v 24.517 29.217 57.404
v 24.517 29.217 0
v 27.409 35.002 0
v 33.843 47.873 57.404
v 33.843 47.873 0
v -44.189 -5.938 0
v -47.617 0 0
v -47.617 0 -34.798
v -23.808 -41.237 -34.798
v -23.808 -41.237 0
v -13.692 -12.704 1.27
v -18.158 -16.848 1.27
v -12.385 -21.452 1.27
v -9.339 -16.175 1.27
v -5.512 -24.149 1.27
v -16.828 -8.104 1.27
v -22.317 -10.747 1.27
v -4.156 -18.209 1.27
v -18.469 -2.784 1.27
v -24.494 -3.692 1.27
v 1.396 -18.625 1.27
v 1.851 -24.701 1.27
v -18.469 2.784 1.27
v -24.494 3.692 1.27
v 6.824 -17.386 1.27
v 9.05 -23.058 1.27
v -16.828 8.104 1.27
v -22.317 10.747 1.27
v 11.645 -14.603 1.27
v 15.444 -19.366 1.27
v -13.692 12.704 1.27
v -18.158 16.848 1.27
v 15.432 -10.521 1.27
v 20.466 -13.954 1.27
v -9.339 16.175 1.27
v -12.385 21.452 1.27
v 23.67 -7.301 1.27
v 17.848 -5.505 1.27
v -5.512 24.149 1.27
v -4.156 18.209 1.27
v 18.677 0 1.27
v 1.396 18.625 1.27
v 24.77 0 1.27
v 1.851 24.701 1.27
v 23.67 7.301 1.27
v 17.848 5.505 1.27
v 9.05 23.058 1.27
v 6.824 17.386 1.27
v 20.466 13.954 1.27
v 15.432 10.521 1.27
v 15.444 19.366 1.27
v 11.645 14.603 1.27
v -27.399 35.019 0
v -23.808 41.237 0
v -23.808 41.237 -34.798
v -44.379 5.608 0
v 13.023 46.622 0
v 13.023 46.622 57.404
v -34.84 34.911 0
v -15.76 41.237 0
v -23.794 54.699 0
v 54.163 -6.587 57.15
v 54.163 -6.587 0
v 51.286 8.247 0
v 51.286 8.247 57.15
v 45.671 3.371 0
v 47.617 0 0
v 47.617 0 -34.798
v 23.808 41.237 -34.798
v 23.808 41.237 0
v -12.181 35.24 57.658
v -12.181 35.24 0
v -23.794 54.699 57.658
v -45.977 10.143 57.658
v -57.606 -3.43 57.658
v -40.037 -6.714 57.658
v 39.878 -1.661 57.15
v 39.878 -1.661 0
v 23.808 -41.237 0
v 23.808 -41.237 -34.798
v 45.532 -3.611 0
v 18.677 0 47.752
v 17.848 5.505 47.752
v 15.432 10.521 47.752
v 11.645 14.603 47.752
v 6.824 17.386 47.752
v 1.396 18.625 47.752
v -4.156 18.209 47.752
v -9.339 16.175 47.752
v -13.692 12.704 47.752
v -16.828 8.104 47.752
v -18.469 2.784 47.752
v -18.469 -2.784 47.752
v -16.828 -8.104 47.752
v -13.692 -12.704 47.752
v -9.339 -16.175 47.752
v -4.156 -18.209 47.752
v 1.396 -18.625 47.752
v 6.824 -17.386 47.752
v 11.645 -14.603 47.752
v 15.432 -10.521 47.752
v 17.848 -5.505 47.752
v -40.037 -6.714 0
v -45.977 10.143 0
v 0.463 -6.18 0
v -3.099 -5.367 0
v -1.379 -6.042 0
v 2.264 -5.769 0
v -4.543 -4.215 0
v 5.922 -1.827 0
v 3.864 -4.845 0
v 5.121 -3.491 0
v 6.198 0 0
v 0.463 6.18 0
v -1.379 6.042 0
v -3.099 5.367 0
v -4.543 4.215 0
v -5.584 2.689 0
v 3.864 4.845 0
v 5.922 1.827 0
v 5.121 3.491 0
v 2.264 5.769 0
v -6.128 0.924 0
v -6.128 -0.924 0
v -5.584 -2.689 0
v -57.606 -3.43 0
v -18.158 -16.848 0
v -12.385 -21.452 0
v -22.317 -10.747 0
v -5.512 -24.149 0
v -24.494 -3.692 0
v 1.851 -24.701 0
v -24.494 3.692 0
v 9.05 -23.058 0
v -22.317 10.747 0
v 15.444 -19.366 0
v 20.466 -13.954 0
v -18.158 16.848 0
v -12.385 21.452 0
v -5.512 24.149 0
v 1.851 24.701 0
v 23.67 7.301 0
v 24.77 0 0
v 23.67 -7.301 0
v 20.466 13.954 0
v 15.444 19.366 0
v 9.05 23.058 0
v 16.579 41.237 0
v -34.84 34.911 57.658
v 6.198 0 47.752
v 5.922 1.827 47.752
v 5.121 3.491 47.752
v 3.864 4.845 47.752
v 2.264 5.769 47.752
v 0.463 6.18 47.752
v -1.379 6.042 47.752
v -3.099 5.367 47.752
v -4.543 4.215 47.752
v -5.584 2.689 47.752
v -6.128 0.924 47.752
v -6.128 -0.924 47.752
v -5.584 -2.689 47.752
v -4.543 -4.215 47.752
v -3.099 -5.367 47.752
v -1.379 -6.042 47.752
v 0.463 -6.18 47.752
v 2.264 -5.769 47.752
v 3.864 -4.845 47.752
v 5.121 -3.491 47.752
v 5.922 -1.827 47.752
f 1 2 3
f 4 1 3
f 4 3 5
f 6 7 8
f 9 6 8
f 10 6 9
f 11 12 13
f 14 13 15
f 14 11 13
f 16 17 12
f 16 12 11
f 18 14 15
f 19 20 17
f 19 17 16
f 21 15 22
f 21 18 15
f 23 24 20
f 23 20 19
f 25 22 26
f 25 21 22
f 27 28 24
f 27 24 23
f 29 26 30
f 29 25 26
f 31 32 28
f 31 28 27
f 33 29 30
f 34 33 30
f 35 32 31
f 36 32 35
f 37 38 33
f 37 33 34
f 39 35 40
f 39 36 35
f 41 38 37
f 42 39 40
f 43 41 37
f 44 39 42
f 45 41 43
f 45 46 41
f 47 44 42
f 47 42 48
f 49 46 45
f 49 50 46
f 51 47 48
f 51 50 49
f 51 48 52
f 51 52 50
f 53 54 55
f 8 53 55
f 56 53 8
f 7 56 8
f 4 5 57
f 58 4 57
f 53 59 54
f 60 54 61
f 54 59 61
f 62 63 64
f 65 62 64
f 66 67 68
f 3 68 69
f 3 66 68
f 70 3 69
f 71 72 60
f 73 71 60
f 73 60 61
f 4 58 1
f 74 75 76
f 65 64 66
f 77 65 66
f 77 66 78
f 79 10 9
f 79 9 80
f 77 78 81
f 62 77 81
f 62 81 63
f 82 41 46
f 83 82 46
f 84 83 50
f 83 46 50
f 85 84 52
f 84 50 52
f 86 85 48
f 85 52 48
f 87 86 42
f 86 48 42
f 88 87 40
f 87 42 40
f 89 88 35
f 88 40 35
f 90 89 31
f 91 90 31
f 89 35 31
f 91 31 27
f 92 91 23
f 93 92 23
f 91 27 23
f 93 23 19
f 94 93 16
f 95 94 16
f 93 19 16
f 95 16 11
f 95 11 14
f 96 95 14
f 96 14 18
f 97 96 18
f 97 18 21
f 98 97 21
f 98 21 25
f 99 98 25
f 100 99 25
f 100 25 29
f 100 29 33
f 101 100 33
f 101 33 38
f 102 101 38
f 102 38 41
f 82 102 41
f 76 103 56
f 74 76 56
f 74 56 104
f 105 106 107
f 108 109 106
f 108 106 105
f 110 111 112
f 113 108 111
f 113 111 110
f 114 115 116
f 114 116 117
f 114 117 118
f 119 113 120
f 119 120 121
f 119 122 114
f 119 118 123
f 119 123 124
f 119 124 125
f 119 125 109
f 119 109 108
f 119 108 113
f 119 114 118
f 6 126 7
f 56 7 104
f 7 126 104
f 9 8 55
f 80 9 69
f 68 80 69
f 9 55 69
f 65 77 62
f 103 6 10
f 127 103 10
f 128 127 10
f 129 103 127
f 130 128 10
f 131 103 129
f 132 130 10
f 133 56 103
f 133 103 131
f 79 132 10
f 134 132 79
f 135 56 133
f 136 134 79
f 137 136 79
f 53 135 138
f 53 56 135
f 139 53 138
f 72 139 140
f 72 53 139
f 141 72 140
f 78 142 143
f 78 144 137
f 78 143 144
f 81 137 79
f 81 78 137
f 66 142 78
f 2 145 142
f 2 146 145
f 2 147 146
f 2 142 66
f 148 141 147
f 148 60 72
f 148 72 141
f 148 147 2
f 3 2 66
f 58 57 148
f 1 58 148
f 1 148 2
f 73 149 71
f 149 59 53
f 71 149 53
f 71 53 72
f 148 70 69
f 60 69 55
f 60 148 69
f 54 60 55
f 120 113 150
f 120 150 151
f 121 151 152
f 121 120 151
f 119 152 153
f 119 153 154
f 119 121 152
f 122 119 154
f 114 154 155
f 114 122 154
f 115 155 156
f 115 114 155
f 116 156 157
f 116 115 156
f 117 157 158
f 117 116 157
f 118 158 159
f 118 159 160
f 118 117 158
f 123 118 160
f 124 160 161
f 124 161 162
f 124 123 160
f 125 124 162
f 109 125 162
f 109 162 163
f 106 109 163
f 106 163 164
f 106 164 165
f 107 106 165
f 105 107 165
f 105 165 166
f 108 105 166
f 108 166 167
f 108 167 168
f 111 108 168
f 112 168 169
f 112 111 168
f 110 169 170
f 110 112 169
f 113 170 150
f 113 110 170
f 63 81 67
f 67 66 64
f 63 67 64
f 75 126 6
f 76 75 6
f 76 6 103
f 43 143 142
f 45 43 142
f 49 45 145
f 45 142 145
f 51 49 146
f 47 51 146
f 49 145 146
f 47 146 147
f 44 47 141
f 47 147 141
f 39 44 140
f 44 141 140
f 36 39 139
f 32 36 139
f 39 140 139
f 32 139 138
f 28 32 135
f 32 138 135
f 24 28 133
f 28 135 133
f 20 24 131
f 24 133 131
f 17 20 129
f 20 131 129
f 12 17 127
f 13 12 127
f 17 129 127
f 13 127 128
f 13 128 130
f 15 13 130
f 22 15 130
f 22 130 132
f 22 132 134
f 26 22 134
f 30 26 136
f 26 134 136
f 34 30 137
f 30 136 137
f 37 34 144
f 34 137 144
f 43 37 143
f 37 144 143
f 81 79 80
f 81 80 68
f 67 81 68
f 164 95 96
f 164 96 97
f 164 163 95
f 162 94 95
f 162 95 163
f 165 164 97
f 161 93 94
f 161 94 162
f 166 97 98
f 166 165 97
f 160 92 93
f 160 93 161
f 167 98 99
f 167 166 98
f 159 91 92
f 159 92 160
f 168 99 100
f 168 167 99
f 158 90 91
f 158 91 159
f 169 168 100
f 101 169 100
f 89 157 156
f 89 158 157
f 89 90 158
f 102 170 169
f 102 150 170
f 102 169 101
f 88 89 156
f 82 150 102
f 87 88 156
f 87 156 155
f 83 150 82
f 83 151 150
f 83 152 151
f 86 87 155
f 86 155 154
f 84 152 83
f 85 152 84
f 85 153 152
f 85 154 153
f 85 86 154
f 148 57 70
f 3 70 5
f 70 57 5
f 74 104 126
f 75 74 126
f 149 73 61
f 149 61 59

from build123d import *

# Parameters (mm, degrees)
F0_R      = 18.677485
F0_R_2    = 6.197536
F1_DEPTH  = 47.752
F3_DEPTH  = 34.798
F4_R      = 24.770199
F4_R_2    = 12.651261
F5_DEPTH  = 1.27
F7_DEPTH  = 57.658
F9_DEPTH  = 57.404
F11_DEPTH = 57.658
F13_DEPTH = 57.15


with BuildPart() as f1:
    # F0 (on Top) → F1 (new body)
    with BuildSketch(Plane.XY):
        Circle(F0_R)
        Circle(F0_R_2, mode=Mode.SUBTRACT)
    extrude(amount=F1_DEPTH)

    # F2 (on Top) → F3 (join)
    with BuildSketch(Plane.XY):
        Polygon((23.808415, 41.237384), (-23.808415, 41.237384), (-47.61683, 0), (-23.808415, -41.237384), (23.808415, -41.237384), (47.61683, 0), align=None)
    extrude(amount=-F3_DEPTH)

    # F4 (on Top) → F5 (join)
    with BuildSketch(Plane.XY):
        Circle(F4_R)
        Circle(F4_R_2, mode=Mode.SUBTRACT)
    extrude(amount=F5_DEPTH)

    # F6 (on Top) → F7 (join)
    with BuildSketch(Plane.XY):
        Polygon((-12.180529, 35.239672), (-23.794444, 54.69878), (-34.839569, 34.911281), align=None)
    extrude(amount=F7_DEPTH)

    # F8 (on Top) → F9 (join)
    with BuildSketch(Plane.XY):
        Polygon((24.516974, 29.217048), (33.843096, 47.873281), (13.023263, 46.621824), align=None)
    extrude(amount=F9_DEPTH)

    # F10 (on Top) → F11 (join)
    with BuildSketch(Plane.XY):
        Polygon((-40.036782, -6.71368), (-45.977313, 10.143448), (-57.605748, -3.429767), align=None)
    extrude(amount=F11_DEPTH)

    # F12 (on Top) → F13 (join)
    with BuildSketch(Plane.XY):
        Polygon((54.162623, -6.586678), (51.286034, 8.247477), (39.877574, -1.660799), align=None)
    extrude(amount=F13_DEPTH)


solid = f1.part
